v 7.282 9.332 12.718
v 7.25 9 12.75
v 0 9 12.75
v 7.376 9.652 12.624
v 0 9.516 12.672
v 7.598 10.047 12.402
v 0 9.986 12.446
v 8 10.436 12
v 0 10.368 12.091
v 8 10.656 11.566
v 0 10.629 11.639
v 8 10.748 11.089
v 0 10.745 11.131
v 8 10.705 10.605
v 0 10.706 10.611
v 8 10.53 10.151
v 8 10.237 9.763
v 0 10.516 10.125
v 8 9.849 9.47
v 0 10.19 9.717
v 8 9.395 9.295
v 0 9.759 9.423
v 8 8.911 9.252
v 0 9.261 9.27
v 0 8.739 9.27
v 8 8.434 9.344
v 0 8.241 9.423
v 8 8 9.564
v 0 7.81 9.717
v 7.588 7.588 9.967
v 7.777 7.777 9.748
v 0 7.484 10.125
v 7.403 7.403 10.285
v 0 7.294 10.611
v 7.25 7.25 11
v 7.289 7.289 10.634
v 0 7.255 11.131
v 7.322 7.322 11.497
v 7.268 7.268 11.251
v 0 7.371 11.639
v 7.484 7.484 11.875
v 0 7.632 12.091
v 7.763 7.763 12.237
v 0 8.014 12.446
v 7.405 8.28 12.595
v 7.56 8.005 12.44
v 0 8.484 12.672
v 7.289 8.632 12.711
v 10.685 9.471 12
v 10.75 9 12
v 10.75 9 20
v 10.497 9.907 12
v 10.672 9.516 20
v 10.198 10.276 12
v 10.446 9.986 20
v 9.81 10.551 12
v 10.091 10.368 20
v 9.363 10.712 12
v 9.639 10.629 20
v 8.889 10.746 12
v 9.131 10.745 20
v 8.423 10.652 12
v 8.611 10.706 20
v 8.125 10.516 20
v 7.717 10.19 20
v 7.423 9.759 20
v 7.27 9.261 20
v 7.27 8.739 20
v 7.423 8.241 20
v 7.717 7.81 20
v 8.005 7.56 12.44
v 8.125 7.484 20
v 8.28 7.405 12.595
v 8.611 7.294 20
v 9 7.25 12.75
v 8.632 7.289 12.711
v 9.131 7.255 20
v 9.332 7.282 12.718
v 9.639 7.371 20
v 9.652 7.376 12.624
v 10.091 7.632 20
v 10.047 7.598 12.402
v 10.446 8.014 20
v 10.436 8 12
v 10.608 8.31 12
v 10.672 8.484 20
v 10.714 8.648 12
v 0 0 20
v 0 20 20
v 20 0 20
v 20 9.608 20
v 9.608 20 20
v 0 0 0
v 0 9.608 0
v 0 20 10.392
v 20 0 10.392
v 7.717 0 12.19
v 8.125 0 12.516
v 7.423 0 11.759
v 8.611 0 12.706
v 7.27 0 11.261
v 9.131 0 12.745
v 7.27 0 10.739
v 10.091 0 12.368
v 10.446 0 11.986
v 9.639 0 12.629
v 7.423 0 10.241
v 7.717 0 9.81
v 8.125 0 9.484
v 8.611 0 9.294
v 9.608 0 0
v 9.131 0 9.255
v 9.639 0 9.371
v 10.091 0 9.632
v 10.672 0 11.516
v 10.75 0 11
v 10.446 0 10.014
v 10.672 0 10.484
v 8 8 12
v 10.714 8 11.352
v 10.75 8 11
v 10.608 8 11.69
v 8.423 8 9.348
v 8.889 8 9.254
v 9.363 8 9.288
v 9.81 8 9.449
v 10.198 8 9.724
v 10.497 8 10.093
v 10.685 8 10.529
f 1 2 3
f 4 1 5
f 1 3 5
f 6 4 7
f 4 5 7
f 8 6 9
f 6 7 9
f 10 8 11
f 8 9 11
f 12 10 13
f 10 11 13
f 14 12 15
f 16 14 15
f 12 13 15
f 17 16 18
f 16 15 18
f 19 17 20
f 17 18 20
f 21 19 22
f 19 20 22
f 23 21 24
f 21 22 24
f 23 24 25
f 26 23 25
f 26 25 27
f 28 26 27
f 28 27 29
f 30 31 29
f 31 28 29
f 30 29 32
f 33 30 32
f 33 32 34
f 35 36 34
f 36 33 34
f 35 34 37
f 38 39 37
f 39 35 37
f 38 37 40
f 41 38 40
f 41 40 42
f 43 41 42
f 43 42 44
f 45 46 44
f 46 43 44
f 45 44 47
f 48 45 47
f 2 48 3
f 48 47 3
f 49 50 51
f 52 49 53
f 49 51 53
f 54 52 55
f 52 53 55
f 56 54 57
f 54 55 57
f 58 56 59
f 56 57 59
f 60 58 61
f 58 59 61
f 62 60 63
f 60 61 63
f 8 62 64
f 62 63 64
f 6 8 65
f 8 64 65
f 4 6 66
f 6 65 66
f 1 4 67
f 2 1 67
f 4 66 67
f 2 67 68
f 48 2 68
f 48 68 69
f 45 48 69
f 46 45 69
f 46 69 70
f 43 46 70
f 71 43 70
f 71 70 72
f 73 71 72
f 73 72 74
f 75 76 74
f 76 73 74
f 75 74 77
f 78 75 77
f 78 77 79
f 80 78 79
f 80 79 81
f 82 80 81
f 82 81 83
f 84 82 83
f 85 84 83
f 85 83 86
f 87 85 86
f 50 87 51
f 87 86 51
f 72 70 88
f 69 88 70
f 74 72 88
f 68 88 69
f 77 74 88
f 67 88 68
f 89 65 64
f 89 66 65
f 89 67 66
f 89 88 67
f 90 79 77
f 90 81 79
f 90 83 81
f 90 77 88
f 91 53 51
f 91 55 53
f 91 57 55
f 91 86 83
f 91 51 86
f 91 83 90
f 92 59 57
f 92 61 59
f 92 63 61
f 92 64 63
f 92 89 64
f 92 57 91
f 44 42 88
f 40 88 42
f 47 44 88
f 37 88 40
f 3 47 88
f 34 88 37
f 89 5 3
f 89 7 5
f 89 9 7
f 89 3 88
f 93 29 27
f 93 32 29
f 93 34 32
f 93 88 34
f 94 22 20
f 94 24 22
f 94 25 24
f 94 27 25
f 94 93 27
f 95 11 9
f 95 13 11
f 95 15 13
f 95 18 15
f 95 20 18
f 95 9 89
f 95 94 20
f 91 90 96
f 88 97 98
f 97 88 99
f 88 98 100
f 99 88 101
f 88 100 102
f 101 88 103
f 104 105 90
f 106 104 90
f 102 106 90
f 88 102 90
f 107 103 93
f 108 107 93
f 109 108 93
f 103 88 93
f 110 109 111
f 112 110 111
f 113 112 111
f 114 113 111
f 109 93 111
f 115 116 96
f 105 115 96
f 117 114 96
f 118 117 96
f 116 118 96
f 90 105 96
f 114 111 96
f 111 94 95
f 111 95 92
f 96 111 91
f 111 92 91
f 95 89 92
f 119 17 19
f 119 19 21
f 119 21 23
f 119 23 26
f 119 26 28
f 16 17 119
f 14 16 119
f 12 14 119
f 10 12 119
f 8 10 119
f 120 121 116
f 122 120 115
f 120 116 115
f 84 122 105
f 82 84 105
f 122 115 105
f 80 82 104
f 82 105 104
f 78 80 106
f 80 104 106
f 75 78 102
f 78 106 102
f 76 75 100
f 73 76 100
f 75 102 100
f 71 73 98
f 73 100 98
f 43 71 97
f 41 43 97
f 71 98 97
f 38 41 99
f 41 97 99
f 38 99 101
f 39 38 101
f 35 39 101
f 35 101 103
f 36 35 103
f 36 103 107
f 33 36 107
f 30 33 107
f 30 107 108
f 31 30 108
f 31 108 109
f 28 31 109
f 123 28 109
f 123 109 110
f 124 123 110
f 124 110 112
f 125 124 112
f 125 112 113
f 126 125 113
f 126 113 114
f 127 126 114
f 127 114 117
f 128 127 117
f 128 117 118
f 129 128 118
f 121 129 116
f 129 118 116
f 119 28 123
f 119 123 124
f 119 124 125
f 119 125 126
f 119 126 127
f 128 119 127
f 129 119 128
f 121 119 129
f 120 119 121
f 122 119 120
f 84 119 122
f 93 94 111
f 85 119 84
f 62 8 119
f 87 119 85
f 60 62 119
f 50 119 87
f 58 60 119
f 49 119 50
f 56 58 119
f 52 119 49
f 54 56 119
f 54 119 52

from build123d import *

# Parameters (mm, degrees)
ESQUISSE1_W                  = 20
ESQUISSE1_H                  = 20
BOSS_EXTRU_1_DEPTH           = 20
ESQUISSE2_W                  = 32.659863237
ESQUISSE2_H                  = 28.284271247
ENL_V_MAT_EXTRU_1_DEPTH      = 6
ENL_V_MAT_EXTRU_1_DEPTH_BACK = 12.547005384
ESQUISSE4_R                  = 1.75
ENL_V_MAT_EXTRU_2_DEPTH      = 1
ENL_V_MAT_EXTRU_2_DEPTH_BACK = 8
ESQUISSE5_R                  = 1.75
ENL_V_MAT_EXTRU_3_DEPTH      = 1
ENL_V_MAT_EXTRU_3_DEPTH_BACK = 8
ESQUISSE6_R                  = 1.75
ENL_V_MAT_EXTRU_4_DEPTH      = 1
ENL_V_MAT_EXTRU_4_DEPTH_BACK = 8


with BuildPart() as part:
    # Esquisse1 → Boss.-Extru.1 (new body)
    with BuildSketch(Plane.XY):
        with Locations((10, 10)):
            Rectangle(ESQUISSE1_W, ESQUISSE1_H)
    extrude(amount=BOSS_EXTRU_1_DEPTH)

    # Esquisse2 → Enlèv. mat.-Extru.1 (cut, two sides)
    with BuildSketch(Plane(origin=(6.666666667, 6.666666667, -6.666666667), x_dir=(0.816496581, -0.40824829, 0.40824829), z_dir=(-0.577350269, -0.577350269, 0.577350269))) as enl_v_mat_extru_1_sk:
        with Locations((8.164965809, 14.142135624)):
            Rectangle(ESQUISSE2_W, ESQUISSE2_H)
    extrude(amount=ENL_V_MAT_EXTRU_1_DEPTH, mode=Mode.SUBTRACT)
    extrude(enl_v_mat_extru_1_sk.sketch, amount=-ENL_V_MAT_EXTRU_1_DEPTH_BACK, mode=Mode.SUBTRACT)

    # Esquisse4 → Enlèv. mat.-Extru.2 (cut, two sides)
    with BuildSketch(Plane.XZ) as enl_v_mat_extru_2_sk:
        with Locations((9, 11)):
            Circle(ESQUISSE4_R)
    extrude(amount=ENL_V_MAT_EXTRU_2_DEPTH, mode=Mode.SUBTRACT)
    extrude(enl_v_mat_extru_2_sk.sketch, amount=-ENL_V_MAT_EXTRU_2_DEPTH_BACK, mode=Mode.SUBTRACT)

    # Esquisse5 → Enlèv. mat.-Extru.3 (cut, two sides)
    with BuildSketch(Plane.XY.offset(20)) as enl_v_mat_extru_3_sk:
        with Locations((9, 9)):
            Circle(ESQUISSE5_R)
    extrude(amount=ENL_V_MAT_EXTRU_3_DEPTH, mode=Mode.SUBTRACT)
    extrude(enl_v_mat_extru_3_sk.sketch, amount=-ENL_V_MAT_EXTRU_3_DEPTH_BACK, mode=Mode.SUBTRACT)

    # Esquisse6 → Enlèv. mat.-Extru.4 (cut, two sides)
    with BuildSketch(Plane.ZY) as enl_v_mat_extru_4_sk:
        with Locations((11, 9)):
            Circle(ESQUISSE6_R)
    extrude(amount=ENL_V_MAT_EXTRU_4_DEPTH, mode=Mode.SUBTRACT)
    extrude(enl_v_mat_extru_4_sk.sketch, amount=-ENL_V_MAT_EXTRU_4_DEPTH_BACK, mode=Mode.SUBTRACT)


solid = part.part
